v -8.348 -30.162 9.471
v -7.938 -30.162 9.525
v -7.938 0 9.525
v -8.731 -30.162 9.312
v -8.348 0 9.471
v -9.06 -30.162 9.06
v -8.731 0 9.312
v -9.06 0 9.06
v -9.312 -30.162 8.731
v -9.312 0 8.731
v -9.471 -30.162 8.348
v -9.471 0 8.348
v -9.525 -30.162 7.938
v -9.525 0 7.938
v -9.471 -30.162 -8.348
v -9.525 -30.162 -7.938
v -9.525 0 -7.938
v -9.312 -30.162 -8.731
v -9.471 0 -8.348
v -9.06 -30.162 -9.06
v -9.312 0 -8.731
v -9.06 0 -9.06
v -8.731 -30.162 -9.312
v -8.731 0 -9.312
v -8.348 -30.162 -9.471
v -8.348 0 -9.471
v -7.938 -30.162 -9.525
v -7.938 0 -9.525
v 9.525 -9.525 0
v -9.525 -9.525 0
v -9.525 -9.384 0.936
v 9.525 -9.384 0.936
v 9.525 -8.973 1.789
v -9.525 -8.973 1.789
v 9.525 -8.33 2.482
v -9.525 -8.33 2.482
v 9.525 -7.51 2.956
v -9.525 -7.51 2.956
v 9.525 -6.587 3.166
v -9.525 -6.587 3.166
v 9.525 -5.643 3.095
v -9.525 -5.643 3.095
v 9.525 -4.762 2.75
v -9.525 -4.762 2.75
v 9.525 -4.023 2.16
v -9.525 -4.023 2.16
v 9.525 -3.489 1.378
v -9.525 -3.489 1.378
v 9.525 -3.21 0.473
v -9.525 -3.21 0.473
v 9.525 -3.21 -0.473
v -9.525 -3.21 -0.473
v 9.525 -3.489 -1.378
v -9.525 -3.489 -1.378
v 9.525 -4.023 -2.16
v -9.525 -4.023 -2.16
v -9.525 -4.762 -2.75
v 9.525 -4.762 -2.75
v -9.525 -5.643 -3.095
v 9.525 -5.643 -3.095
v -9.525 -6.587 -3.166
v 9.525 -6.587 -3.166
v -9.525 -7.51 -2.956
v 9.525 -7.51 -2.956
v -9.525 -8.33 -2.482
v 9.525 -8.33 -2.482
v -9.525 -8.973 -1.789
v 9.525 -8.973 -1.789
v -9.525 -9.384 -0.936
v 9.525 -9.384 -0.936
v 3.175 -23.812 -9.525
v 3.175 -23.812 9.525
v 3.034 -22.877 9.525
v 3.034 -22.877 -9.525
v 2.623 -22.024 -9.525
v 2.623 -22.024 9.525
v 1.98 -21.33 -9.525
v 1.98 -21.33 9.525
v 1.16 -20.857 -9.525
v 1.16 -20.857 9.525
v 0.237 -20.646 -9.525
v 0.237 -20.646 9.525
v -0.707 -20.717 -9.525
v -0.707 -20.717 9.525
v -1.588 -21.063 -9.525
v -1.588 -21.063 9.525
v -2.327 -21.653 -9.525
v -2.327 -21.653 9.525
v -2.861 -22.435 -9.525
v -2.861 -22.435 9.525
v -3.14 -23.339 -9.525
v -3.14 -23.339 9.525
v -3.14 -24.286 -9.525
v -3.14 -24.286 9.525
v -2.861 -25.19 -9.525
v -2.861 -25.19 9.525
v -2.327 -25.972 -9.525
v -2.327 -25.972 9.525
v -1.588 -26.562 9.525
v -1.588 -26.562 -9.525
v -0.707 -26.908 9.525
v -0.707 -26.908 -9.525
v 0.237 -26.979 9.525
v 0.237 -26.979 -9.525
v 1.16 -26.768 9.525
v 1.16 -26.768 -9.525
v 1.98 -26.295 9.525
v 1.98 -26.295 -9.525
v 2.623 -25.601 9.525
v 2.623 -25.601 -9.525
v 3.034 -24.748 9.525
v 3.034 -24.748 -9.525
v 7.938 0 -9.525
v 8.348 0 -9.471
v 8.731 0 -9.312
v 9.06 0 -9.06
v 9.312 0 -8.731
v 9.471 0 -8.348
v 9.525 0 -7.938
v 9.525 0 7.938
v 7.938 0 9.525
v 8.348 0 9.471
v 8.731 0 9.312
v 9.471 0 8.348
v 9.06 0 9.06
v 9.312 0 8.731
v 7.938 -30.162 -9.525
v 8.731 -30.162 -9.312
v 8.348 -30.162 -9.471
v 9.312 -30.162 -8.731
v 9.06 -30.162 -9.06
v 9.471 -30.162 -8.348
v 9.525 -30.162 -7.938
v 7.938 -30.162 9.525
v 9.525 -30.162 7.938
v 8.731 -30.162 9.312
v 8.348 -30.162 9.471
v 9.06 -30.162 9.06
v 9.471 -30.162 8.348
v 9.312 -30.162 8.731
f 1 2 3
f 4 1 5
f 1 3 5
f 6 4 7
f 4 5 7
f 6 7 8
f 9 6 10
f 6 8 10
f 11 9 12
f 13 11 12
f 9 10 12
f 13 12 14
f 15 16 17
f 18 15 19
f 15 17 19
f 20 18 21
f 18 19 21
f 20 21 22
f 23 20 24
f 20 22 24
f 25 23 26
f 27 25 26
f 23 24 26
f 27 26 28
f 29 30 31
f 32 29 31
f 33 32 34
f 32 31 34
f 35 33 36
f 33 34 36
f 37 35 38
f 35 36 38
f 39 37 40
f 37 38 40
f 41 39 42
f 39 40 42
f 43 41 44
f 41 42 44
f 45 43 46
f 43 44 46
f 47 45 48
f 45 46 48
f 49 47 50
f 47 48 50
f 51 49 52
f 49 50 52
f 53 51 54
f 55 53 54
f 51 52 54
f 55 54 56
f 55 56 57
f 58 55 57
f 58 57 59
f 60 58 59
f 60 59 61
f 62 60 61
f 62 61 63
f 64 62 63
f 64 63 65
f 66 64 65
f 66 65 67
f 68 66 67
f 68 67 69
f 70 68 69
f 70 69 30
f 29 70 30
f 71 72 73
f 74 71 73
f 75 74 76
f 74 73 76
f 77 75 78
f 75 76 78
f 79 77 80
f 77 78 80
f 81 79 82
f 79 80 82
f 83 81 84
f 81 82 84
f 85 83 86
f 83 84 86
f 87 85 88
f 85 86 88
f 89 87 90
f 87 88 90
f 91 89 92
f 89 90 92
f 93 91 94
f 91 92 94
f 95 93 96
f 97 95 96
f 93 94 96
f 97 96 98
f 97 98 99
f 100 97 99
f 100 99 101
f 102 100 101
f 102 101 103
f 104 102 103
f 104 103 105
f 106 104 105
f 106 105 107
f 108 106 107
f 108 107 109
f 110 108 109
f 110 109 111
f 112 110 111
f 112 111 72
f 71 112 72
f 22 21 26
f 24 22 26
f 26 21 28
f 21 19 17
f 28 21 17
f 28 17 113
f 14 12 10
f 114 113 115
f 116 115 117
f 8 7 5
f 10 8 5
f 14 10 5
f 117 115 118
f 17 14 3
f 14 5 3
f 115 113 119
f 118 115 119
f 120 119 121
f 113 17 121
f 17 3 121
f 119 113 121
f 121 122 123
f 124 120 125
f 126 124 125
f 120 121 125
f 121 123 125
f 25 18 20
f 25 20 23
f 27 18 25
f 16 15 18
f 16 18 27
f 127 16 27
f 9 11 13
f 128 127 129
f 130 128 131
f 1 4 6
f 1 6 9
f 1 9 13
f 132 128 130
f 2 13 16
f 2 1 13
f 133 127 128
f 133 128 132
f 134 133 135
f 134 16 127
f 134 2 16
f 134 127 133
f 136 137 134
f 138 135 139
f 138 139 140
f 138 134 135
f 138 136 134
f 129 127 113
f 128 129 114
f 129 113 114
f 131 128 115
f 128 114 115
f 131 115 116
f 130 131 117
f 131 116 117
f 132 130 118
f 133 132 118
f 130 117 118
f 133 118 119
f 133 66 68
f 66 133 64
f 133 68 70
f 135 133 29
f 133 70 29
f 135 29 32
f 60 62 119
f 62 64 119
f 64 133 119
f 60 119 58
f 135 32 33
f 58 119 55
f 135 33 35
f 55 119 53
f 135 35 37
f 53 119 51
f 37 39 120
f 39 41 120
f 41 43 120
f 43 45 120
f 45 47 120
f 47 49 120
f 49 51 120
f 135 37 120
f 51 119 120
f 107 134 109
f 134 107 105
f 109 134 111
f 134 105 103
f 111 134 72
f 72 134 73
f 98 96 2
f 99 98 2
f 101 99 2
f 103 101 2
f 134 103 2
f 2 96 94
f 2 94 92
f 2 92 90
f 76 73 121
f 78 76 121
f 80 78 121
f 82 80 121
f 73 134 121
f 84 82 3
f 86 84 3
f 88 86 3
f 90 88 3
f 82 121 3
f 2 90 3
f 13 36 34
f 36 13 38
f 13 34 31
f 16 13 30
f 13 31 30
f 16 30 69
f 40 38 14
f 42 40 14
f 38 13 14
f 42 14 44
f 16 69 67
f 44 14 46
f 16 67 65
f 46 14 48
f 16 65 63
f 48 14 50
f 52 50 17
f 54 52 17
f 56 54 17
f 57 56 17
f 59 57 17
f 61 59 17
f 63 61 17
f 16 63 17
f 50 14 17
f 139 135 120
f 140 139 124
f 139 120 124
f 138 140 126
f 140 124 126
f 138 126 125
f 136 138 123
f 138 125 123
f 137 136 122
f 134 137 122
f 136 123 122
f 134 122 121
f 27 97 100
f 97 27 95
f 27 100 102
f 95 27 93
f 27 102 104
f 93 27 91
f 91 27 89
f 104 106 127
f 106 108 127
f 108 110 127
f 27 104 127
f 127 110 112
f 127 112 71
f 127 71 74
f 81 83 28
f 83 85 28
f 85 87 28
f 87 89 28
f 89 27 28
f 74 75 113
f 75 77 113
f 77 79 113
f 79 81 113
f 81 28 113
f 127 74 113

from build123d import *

# Parameters (mm, degrees)
F1_DEPTH = 30.1625
F2_R     = 3.175
F3_DEPTH = 19.051
F4_R     = 3.175
F5_DEPTH = 19.051


with BuildPart() as f1:
    # F0 (on Front) → F1 (new body)
    with BuildSketch(Plane.XZ):
        with BuildLine():
            ThreePointArc((9.525, 7.9375), (9.060032, 9.060032), (7.9375, 9.525))
            Line((7.9375, 9.525), (-7.9375, 9.525))
            ThreePointArc((-7.9375, 9.525), (-9.060032, 9.060032), (-9.525, 7.9375))
            Line((-9.525, 7.9375), (-9.525, -7.9375))
            ThreePointArc((-9.525, -7.9375), (-9.060032, -9.060032), (-7.9375, -9.525))
            Line((-7.9375, -9.525), (7.9375, -9.525))
            ThreePointArc((7.9375, -9.525), (9.060032, -9.060032), (9.525, -7.9375))
            Line((9.525, -7.9375), (9.525, 7.9375))
        make_face()
    extrude(amount=F1_DEPTH)

    # F2 (on face) → F3 (cut, through all)
    with BuildSketch(Plane.XY.offset(9.525)):
        with Locations((0, -23.8125)):
            Circle(F2_R)
    extrude(amount=-F3_DEPTH, mode=Mode.SUBTRACT)

    # F4 (on face) → F5 (cut, through all)
    with BuildSketch(Plane(origin=(-9.525, 0, 0), x_dir=(0, -1, 0), z_dir=(-1, 0, 0))):
        with Locations((6.35, 0)):
            Circle(F4_R)
    extrude(amount=-F5_DEPTH, mode=Mode.SUBTRACT)


solid = f1.part
